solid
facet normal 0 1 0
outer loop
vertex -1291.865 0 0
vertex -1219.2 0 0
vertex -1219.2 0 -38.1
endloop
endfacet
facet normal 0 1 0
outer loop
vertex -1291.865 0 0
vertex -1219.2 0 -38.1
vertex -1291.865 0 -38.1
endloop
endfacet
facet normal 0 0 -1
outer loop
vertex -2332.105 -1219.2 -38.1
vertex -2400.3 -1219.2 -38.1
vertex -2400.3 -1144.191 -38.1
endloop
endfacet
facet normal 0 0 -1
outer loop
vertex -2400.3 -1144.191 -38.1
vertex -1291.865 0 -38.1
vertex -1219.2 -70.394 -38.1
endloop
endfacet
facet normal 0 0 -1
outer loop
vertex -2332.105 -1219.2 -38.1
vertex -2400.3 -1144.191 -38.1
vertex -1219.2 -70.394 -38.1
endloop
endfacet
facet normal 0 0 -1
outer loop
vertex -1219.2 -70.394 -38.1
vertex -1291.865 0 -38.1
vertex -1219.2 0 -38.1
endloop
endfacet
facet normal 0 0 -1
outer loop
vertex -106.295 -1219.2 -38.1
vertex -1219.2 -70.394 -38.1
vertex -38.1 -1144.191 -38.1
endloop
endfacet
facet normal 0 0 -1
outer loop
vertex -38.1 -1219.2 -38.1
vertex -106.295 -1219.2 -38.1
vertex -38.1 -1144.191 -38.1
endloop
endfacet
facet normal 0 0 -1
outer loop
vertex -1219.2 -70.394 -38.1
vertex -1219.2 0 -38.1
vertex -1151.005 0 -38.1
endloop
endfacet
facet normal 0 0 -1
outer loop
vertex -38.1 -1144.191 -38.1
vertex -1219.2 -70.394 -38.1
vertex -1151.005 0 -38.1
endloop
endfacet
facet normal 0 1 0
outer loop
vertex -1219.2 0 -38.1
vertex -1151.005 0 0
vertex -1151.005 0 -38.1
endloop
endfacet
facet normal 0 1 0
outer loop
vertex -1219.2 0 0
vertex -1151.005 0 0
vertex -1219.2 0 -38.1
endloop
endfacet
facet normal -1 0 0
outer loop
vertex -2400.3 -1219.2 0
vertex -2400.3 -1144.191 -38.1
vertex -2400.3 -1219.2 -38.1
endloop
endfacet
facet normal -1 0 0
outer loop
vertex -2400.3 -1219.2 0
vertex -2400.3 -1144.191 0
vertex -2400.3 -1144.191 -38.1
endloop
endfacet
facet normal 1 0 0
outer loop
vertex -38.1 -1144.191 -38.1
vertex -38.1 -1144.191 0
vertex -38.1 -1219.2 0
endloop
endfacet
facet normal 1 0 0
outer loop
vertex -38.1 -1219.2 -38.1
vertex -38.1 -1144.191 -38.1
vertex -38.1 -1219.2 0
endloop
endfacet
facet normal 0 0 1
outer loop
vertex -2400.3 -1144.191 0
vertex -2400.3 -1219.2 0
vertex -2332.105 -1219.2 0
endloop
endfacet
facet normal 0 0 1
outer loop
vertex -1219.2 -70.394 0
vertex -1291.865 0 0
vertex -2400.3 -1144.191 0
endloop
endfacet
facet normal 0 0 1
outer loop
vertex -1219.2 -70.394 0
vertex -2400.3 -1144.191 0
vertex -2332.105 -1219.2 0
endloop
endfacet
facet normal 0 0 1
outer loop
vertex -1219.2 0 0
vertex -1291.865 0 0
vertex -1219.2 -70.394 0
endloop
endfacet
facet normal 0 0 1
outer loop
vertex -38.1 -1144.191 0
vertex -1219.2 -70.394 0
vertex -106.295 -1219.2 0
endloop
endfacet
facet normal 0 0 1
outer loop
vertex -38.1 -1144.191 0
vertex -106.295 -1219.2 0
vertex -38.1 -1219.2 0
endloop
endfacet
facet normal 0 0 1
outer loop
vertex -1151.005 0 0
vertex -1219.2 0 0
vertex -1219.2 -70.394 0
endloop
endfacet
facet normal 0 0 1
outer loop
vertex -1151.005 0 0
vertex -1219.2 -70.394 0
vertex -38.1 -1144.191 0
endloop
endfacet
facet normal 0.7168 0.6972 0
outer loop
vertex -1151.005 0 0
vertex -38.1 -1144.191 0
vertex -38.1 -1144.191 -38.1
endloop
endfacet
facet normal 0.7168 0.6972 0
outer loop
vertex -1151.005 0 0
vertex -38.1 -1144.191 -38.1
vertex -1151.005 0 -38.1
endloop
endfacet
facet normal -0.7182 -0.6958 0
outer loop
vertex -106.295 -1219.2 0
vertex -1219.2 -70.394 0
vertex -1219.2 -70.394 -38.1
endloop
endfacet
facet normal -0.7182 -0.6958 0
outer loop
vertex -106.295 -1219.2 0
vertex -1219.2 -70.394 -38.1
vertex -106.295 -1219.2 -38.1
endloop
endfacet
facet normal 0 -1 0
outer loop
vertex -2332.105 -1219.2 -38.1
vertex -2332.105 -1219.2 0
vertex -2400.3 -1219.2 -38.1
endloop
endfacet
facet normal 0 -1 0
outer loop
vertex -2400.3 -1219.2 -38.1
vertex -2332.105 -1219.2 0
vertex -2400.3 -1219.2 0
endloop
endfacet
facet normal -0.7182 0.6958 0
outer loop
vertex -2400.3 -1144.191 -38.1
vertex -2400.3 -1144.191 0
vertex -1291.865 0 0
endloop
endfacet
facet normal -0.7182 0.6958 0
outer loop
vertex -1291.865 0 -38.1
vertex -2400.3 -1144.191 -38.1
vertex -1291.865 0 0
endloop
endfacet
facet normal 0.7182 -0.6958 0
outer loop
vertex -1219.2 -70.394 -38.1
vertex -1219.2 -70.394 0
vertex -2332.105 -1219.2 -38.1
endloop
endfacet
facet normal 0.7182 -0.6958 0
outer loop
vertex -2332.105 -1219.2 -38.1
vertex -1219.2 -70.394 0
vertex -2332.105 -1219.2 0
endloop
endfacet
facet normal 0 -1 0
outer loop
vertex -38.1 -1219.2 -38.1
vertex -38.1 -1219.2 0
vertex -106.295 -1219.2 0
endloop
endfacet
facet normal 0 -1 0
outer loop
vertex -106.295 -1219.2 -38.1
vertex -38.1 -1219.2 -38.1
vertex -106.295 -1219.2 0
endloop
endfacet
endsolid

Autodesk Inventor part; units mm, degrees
ref_plane "YZ Plane" through (0, 0, 0) normal (1, 0, 0) x (0, 1, 0)
ref_plane "XZ Plane" through (0, 0, 0) normal (0, 1, 0) x (-1, 0, 0)
ref_plane "XY Plane" through (0, 0, 0) normal (0, 0, 1) x (1, 0, 0)
sketch "Sketch1" plane through (0, 0, 0) normal (0, 0, 1) x (1, 0, 0)
  line L0 (0, 0) -> (-2438.4, 0) projected
  line L1 (-38.1, 0) -> (-38.1, -1219.2) projected
  line L2 (0, -1219.2) -> (-2438.4, -1219.2) projected
  line L3 (-2400.3, 0) -> (-2400.3, -1219.2) projected
  line L4 (-2400.3, -1219.2) -> (-2400.3, -1144.1906)
  line L5 (-2400.3, -1144.1906) -> (-1291.8653, 0)
  line L6 (-1219.2, 0) -> (-1291.8653, 0)
  line L7 (-1219.2, -70.3945) -> (-2332.1053, -1219.2)
  line L8 (-2332.1053, -1219.2) -> (-2400.3, -1219.2)
  line L9 (-1219.2, -70.3945) -> (-106.2947, -1219.2)
  line L10 (-38.1, -1219.2) -> (-106.2947, -1219.2)
  line L11 (-38.1, -1219.2) -> (-38.1, -1144.1906)
  line L12 (-38.1, -1144.1906) -> (-1151.0053, 0)
  line L13 (-1219.2, 0) -> (-1151.0053, 0)
extrude "Extrusion1" add sketch "Sketch1" against normal blind 38.1 contours L12 L1 L2 L9 L7 L3 L5 L0
properties part number "48x2x4-2"
